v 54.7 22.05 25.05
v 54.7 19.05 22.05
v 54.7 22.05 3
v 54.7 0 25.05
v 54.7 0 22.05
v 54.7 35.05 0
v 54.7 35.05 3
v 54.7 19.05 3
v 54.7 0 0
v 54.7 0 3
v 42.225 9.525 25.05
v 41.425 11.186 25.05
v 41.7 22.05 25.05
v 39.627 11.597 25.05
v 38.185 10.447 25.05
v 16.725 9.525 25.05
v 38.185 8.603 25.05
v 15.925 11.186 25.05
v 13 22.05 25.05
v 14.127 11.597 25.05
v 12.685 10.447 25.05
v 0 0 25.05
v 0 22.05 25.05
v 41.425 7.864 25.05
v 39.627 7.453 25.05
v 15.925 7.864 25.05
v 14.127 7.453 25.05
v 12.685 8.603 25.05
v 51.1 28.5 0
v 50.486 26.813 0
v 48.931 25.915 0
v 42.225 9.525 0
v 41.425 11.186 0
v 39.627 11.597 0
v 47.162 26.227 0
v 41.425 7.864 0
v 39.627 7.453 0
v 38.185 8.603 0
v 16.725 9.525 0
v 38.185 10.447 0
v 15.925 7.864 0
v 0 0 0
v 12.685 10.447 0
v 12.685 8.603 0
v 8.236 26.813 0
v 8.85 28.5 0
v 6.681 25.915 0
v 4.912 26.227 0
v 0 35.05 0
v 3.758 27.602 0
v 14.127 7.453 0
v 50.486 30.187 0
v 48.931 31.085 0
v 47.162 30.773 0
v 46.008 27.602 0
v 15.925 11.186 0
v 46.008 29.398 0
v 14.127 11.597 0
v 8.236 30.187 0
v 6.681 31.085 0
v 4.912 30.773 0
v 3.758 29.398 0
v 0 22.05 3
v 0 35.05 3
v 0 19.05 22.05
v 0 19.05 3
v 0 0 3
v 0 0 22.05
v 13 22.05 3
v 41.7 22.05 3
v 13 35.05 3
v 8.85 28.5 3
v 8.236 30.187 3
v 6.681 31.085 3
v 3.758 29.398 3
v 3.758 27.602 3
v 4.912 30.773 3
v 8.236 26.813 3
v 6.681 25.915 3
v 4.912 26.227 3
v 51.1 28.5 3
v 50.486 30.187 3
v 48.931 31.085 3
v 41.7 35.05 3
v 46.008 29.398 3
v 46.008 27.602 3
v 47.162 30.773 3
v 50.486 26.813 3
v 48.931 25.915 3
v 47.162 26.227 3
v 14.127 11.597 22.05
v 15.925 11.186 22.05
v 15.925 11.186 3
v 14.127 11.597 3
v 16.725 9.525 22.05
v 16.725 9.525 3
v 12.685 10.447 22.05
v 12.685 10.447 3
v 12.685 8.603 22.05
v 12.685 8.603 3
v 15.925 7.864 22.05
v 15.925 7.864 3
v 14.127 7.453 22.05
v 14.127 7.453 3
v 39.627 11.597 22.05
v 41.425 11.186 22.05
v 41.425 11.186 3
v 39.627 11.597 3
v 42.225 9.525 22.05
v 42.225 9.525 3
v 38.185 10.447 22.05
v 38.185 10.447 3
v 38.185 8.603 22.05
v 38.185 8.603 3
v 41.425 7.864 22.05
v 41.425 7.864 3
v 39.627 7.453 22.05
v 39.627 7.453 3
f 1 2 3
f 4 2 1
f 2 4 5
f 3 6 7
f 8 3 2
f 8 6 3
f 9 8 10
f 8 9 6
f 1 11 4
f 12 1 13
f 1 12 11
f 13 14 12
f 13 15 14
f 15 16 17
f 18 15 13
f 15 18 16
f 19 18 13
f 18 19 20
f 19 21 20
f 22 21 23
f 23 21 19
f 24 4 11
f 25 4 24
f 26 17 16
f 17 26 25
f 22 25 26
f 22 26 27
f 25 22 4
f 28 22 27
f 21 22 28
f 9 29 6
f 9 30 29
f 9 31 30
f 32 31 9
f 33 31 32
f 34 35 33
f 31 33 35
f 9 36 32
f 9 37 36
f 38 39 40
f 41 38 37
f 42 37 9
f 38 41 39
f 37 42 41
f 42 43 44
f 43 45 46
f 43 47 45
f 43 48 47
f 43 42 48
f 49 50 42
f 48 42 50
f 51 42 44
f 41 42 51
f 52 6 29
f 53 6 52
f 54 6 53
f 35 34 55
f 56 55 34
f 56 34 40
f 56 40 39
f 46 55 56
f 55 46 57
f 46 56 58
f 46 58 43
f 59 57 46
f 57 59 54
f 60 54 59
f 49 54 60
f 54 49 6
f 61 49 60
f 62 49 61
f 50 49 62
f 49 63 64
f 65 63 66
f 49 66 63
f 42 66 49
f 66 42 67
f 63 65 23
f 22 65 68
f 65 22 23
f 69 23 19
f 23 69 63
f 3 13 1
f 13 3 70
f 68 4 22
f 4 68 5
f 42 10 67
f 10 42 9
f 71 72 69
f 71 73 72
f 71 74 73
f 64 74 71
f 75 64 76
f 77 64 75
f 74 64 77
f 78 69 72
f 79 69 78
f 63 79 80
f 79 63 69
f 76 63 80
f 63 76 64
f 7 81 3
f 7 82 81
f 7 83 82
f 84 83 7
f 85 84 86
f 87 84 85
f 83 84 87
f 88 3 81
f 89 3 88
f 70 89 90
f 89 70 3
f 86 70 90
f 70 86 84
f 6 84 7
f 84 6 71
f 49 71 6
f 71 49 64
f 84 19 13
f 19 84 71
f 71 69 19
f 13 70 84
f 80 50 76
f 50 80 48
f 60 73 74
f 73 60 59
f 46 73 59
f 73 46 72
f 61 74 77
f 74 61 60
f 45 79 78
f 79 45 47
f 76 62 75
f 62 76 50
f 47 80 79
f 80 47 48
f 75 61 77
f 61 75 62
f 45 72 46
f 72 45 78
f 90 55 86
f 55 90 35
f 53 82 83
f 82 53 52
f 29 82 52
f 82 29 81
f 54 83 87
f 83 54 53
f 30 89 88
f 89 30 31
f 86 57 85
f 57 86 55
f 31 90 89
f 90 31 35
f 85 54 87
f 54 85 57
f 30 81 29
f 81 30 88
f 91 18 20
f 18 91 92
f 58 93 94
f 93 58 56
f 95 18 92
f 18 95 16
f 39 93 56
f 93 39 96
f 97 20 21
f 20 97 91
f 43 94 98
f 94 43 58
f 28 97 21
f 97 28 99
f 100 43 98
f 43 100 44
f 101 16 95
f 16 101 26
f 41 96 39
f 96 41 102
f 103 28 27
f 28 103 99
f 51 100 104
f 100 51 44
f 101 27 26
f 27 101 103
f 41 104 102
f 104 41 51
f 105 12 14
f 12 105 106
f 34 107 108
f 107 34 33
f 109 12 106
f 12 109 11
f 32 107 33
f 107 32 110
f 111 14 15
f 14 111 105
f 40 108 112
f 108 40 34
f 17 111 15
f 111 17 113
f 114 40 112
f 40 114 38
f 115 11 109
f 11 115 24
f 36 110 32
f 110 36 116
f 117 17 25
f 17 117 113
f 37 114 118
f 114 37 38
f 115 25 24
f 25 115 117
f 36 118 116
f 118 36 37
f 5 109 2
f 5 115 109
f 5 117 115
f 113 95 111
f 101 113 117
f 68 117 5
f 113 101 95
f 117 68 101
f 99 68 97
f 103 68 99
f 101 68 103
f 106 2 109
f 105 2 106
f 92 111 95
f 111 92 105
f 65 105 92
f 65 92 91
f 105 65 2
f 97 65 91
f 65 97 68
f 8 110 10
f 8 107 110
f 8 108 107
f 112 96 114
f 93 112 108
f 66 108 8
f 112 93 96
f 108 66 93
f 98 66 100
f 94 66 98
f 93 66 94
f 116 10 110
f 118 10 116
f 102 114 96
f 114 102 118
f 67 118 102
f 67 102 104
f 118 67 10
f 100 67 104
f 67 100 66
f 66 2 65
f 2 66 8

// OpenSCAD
module holder()
{
    difference()
    {
        union()
        {
            color("blue") cube([54.7,22.05,25.05]);
            color("blue") cube([54.7,35.05,3]);
            color("purple") polyhedron(points=[
                [13,22.05,3], // 0
                [13,22.05,25.05], // 1
                [13,35.05,3], // 2
                [41.7,22.05,3], // 3
                [41.7,22.05,25.05], // 4
                [41.7,35.05,3] // 5
            ],
            faces=[
                [0,2,5,3],
                [0,3,4,1],
                [1,4,5,2],
                [1,2,0],
                [4,3,5]
            ]);
        }
        #color("red") translate([-1,-1,3]) cube([60,20.05,19.05]);
        #color("yellow") translate([6.225,28.5,-1]) union()
        {
            cylinder(d=5.25,h=27);
            translate([42.25,0,0]) cylinder(d=5.25,h=27);
        }

        #color("yellow") translate([14.6,9.525,-1]) union()
        {
            cylinder(d=4.25,h=27);
            translate([25.5,0,0]) cylinder(d=4.25,h=27);
        }
    }
}
holder();
